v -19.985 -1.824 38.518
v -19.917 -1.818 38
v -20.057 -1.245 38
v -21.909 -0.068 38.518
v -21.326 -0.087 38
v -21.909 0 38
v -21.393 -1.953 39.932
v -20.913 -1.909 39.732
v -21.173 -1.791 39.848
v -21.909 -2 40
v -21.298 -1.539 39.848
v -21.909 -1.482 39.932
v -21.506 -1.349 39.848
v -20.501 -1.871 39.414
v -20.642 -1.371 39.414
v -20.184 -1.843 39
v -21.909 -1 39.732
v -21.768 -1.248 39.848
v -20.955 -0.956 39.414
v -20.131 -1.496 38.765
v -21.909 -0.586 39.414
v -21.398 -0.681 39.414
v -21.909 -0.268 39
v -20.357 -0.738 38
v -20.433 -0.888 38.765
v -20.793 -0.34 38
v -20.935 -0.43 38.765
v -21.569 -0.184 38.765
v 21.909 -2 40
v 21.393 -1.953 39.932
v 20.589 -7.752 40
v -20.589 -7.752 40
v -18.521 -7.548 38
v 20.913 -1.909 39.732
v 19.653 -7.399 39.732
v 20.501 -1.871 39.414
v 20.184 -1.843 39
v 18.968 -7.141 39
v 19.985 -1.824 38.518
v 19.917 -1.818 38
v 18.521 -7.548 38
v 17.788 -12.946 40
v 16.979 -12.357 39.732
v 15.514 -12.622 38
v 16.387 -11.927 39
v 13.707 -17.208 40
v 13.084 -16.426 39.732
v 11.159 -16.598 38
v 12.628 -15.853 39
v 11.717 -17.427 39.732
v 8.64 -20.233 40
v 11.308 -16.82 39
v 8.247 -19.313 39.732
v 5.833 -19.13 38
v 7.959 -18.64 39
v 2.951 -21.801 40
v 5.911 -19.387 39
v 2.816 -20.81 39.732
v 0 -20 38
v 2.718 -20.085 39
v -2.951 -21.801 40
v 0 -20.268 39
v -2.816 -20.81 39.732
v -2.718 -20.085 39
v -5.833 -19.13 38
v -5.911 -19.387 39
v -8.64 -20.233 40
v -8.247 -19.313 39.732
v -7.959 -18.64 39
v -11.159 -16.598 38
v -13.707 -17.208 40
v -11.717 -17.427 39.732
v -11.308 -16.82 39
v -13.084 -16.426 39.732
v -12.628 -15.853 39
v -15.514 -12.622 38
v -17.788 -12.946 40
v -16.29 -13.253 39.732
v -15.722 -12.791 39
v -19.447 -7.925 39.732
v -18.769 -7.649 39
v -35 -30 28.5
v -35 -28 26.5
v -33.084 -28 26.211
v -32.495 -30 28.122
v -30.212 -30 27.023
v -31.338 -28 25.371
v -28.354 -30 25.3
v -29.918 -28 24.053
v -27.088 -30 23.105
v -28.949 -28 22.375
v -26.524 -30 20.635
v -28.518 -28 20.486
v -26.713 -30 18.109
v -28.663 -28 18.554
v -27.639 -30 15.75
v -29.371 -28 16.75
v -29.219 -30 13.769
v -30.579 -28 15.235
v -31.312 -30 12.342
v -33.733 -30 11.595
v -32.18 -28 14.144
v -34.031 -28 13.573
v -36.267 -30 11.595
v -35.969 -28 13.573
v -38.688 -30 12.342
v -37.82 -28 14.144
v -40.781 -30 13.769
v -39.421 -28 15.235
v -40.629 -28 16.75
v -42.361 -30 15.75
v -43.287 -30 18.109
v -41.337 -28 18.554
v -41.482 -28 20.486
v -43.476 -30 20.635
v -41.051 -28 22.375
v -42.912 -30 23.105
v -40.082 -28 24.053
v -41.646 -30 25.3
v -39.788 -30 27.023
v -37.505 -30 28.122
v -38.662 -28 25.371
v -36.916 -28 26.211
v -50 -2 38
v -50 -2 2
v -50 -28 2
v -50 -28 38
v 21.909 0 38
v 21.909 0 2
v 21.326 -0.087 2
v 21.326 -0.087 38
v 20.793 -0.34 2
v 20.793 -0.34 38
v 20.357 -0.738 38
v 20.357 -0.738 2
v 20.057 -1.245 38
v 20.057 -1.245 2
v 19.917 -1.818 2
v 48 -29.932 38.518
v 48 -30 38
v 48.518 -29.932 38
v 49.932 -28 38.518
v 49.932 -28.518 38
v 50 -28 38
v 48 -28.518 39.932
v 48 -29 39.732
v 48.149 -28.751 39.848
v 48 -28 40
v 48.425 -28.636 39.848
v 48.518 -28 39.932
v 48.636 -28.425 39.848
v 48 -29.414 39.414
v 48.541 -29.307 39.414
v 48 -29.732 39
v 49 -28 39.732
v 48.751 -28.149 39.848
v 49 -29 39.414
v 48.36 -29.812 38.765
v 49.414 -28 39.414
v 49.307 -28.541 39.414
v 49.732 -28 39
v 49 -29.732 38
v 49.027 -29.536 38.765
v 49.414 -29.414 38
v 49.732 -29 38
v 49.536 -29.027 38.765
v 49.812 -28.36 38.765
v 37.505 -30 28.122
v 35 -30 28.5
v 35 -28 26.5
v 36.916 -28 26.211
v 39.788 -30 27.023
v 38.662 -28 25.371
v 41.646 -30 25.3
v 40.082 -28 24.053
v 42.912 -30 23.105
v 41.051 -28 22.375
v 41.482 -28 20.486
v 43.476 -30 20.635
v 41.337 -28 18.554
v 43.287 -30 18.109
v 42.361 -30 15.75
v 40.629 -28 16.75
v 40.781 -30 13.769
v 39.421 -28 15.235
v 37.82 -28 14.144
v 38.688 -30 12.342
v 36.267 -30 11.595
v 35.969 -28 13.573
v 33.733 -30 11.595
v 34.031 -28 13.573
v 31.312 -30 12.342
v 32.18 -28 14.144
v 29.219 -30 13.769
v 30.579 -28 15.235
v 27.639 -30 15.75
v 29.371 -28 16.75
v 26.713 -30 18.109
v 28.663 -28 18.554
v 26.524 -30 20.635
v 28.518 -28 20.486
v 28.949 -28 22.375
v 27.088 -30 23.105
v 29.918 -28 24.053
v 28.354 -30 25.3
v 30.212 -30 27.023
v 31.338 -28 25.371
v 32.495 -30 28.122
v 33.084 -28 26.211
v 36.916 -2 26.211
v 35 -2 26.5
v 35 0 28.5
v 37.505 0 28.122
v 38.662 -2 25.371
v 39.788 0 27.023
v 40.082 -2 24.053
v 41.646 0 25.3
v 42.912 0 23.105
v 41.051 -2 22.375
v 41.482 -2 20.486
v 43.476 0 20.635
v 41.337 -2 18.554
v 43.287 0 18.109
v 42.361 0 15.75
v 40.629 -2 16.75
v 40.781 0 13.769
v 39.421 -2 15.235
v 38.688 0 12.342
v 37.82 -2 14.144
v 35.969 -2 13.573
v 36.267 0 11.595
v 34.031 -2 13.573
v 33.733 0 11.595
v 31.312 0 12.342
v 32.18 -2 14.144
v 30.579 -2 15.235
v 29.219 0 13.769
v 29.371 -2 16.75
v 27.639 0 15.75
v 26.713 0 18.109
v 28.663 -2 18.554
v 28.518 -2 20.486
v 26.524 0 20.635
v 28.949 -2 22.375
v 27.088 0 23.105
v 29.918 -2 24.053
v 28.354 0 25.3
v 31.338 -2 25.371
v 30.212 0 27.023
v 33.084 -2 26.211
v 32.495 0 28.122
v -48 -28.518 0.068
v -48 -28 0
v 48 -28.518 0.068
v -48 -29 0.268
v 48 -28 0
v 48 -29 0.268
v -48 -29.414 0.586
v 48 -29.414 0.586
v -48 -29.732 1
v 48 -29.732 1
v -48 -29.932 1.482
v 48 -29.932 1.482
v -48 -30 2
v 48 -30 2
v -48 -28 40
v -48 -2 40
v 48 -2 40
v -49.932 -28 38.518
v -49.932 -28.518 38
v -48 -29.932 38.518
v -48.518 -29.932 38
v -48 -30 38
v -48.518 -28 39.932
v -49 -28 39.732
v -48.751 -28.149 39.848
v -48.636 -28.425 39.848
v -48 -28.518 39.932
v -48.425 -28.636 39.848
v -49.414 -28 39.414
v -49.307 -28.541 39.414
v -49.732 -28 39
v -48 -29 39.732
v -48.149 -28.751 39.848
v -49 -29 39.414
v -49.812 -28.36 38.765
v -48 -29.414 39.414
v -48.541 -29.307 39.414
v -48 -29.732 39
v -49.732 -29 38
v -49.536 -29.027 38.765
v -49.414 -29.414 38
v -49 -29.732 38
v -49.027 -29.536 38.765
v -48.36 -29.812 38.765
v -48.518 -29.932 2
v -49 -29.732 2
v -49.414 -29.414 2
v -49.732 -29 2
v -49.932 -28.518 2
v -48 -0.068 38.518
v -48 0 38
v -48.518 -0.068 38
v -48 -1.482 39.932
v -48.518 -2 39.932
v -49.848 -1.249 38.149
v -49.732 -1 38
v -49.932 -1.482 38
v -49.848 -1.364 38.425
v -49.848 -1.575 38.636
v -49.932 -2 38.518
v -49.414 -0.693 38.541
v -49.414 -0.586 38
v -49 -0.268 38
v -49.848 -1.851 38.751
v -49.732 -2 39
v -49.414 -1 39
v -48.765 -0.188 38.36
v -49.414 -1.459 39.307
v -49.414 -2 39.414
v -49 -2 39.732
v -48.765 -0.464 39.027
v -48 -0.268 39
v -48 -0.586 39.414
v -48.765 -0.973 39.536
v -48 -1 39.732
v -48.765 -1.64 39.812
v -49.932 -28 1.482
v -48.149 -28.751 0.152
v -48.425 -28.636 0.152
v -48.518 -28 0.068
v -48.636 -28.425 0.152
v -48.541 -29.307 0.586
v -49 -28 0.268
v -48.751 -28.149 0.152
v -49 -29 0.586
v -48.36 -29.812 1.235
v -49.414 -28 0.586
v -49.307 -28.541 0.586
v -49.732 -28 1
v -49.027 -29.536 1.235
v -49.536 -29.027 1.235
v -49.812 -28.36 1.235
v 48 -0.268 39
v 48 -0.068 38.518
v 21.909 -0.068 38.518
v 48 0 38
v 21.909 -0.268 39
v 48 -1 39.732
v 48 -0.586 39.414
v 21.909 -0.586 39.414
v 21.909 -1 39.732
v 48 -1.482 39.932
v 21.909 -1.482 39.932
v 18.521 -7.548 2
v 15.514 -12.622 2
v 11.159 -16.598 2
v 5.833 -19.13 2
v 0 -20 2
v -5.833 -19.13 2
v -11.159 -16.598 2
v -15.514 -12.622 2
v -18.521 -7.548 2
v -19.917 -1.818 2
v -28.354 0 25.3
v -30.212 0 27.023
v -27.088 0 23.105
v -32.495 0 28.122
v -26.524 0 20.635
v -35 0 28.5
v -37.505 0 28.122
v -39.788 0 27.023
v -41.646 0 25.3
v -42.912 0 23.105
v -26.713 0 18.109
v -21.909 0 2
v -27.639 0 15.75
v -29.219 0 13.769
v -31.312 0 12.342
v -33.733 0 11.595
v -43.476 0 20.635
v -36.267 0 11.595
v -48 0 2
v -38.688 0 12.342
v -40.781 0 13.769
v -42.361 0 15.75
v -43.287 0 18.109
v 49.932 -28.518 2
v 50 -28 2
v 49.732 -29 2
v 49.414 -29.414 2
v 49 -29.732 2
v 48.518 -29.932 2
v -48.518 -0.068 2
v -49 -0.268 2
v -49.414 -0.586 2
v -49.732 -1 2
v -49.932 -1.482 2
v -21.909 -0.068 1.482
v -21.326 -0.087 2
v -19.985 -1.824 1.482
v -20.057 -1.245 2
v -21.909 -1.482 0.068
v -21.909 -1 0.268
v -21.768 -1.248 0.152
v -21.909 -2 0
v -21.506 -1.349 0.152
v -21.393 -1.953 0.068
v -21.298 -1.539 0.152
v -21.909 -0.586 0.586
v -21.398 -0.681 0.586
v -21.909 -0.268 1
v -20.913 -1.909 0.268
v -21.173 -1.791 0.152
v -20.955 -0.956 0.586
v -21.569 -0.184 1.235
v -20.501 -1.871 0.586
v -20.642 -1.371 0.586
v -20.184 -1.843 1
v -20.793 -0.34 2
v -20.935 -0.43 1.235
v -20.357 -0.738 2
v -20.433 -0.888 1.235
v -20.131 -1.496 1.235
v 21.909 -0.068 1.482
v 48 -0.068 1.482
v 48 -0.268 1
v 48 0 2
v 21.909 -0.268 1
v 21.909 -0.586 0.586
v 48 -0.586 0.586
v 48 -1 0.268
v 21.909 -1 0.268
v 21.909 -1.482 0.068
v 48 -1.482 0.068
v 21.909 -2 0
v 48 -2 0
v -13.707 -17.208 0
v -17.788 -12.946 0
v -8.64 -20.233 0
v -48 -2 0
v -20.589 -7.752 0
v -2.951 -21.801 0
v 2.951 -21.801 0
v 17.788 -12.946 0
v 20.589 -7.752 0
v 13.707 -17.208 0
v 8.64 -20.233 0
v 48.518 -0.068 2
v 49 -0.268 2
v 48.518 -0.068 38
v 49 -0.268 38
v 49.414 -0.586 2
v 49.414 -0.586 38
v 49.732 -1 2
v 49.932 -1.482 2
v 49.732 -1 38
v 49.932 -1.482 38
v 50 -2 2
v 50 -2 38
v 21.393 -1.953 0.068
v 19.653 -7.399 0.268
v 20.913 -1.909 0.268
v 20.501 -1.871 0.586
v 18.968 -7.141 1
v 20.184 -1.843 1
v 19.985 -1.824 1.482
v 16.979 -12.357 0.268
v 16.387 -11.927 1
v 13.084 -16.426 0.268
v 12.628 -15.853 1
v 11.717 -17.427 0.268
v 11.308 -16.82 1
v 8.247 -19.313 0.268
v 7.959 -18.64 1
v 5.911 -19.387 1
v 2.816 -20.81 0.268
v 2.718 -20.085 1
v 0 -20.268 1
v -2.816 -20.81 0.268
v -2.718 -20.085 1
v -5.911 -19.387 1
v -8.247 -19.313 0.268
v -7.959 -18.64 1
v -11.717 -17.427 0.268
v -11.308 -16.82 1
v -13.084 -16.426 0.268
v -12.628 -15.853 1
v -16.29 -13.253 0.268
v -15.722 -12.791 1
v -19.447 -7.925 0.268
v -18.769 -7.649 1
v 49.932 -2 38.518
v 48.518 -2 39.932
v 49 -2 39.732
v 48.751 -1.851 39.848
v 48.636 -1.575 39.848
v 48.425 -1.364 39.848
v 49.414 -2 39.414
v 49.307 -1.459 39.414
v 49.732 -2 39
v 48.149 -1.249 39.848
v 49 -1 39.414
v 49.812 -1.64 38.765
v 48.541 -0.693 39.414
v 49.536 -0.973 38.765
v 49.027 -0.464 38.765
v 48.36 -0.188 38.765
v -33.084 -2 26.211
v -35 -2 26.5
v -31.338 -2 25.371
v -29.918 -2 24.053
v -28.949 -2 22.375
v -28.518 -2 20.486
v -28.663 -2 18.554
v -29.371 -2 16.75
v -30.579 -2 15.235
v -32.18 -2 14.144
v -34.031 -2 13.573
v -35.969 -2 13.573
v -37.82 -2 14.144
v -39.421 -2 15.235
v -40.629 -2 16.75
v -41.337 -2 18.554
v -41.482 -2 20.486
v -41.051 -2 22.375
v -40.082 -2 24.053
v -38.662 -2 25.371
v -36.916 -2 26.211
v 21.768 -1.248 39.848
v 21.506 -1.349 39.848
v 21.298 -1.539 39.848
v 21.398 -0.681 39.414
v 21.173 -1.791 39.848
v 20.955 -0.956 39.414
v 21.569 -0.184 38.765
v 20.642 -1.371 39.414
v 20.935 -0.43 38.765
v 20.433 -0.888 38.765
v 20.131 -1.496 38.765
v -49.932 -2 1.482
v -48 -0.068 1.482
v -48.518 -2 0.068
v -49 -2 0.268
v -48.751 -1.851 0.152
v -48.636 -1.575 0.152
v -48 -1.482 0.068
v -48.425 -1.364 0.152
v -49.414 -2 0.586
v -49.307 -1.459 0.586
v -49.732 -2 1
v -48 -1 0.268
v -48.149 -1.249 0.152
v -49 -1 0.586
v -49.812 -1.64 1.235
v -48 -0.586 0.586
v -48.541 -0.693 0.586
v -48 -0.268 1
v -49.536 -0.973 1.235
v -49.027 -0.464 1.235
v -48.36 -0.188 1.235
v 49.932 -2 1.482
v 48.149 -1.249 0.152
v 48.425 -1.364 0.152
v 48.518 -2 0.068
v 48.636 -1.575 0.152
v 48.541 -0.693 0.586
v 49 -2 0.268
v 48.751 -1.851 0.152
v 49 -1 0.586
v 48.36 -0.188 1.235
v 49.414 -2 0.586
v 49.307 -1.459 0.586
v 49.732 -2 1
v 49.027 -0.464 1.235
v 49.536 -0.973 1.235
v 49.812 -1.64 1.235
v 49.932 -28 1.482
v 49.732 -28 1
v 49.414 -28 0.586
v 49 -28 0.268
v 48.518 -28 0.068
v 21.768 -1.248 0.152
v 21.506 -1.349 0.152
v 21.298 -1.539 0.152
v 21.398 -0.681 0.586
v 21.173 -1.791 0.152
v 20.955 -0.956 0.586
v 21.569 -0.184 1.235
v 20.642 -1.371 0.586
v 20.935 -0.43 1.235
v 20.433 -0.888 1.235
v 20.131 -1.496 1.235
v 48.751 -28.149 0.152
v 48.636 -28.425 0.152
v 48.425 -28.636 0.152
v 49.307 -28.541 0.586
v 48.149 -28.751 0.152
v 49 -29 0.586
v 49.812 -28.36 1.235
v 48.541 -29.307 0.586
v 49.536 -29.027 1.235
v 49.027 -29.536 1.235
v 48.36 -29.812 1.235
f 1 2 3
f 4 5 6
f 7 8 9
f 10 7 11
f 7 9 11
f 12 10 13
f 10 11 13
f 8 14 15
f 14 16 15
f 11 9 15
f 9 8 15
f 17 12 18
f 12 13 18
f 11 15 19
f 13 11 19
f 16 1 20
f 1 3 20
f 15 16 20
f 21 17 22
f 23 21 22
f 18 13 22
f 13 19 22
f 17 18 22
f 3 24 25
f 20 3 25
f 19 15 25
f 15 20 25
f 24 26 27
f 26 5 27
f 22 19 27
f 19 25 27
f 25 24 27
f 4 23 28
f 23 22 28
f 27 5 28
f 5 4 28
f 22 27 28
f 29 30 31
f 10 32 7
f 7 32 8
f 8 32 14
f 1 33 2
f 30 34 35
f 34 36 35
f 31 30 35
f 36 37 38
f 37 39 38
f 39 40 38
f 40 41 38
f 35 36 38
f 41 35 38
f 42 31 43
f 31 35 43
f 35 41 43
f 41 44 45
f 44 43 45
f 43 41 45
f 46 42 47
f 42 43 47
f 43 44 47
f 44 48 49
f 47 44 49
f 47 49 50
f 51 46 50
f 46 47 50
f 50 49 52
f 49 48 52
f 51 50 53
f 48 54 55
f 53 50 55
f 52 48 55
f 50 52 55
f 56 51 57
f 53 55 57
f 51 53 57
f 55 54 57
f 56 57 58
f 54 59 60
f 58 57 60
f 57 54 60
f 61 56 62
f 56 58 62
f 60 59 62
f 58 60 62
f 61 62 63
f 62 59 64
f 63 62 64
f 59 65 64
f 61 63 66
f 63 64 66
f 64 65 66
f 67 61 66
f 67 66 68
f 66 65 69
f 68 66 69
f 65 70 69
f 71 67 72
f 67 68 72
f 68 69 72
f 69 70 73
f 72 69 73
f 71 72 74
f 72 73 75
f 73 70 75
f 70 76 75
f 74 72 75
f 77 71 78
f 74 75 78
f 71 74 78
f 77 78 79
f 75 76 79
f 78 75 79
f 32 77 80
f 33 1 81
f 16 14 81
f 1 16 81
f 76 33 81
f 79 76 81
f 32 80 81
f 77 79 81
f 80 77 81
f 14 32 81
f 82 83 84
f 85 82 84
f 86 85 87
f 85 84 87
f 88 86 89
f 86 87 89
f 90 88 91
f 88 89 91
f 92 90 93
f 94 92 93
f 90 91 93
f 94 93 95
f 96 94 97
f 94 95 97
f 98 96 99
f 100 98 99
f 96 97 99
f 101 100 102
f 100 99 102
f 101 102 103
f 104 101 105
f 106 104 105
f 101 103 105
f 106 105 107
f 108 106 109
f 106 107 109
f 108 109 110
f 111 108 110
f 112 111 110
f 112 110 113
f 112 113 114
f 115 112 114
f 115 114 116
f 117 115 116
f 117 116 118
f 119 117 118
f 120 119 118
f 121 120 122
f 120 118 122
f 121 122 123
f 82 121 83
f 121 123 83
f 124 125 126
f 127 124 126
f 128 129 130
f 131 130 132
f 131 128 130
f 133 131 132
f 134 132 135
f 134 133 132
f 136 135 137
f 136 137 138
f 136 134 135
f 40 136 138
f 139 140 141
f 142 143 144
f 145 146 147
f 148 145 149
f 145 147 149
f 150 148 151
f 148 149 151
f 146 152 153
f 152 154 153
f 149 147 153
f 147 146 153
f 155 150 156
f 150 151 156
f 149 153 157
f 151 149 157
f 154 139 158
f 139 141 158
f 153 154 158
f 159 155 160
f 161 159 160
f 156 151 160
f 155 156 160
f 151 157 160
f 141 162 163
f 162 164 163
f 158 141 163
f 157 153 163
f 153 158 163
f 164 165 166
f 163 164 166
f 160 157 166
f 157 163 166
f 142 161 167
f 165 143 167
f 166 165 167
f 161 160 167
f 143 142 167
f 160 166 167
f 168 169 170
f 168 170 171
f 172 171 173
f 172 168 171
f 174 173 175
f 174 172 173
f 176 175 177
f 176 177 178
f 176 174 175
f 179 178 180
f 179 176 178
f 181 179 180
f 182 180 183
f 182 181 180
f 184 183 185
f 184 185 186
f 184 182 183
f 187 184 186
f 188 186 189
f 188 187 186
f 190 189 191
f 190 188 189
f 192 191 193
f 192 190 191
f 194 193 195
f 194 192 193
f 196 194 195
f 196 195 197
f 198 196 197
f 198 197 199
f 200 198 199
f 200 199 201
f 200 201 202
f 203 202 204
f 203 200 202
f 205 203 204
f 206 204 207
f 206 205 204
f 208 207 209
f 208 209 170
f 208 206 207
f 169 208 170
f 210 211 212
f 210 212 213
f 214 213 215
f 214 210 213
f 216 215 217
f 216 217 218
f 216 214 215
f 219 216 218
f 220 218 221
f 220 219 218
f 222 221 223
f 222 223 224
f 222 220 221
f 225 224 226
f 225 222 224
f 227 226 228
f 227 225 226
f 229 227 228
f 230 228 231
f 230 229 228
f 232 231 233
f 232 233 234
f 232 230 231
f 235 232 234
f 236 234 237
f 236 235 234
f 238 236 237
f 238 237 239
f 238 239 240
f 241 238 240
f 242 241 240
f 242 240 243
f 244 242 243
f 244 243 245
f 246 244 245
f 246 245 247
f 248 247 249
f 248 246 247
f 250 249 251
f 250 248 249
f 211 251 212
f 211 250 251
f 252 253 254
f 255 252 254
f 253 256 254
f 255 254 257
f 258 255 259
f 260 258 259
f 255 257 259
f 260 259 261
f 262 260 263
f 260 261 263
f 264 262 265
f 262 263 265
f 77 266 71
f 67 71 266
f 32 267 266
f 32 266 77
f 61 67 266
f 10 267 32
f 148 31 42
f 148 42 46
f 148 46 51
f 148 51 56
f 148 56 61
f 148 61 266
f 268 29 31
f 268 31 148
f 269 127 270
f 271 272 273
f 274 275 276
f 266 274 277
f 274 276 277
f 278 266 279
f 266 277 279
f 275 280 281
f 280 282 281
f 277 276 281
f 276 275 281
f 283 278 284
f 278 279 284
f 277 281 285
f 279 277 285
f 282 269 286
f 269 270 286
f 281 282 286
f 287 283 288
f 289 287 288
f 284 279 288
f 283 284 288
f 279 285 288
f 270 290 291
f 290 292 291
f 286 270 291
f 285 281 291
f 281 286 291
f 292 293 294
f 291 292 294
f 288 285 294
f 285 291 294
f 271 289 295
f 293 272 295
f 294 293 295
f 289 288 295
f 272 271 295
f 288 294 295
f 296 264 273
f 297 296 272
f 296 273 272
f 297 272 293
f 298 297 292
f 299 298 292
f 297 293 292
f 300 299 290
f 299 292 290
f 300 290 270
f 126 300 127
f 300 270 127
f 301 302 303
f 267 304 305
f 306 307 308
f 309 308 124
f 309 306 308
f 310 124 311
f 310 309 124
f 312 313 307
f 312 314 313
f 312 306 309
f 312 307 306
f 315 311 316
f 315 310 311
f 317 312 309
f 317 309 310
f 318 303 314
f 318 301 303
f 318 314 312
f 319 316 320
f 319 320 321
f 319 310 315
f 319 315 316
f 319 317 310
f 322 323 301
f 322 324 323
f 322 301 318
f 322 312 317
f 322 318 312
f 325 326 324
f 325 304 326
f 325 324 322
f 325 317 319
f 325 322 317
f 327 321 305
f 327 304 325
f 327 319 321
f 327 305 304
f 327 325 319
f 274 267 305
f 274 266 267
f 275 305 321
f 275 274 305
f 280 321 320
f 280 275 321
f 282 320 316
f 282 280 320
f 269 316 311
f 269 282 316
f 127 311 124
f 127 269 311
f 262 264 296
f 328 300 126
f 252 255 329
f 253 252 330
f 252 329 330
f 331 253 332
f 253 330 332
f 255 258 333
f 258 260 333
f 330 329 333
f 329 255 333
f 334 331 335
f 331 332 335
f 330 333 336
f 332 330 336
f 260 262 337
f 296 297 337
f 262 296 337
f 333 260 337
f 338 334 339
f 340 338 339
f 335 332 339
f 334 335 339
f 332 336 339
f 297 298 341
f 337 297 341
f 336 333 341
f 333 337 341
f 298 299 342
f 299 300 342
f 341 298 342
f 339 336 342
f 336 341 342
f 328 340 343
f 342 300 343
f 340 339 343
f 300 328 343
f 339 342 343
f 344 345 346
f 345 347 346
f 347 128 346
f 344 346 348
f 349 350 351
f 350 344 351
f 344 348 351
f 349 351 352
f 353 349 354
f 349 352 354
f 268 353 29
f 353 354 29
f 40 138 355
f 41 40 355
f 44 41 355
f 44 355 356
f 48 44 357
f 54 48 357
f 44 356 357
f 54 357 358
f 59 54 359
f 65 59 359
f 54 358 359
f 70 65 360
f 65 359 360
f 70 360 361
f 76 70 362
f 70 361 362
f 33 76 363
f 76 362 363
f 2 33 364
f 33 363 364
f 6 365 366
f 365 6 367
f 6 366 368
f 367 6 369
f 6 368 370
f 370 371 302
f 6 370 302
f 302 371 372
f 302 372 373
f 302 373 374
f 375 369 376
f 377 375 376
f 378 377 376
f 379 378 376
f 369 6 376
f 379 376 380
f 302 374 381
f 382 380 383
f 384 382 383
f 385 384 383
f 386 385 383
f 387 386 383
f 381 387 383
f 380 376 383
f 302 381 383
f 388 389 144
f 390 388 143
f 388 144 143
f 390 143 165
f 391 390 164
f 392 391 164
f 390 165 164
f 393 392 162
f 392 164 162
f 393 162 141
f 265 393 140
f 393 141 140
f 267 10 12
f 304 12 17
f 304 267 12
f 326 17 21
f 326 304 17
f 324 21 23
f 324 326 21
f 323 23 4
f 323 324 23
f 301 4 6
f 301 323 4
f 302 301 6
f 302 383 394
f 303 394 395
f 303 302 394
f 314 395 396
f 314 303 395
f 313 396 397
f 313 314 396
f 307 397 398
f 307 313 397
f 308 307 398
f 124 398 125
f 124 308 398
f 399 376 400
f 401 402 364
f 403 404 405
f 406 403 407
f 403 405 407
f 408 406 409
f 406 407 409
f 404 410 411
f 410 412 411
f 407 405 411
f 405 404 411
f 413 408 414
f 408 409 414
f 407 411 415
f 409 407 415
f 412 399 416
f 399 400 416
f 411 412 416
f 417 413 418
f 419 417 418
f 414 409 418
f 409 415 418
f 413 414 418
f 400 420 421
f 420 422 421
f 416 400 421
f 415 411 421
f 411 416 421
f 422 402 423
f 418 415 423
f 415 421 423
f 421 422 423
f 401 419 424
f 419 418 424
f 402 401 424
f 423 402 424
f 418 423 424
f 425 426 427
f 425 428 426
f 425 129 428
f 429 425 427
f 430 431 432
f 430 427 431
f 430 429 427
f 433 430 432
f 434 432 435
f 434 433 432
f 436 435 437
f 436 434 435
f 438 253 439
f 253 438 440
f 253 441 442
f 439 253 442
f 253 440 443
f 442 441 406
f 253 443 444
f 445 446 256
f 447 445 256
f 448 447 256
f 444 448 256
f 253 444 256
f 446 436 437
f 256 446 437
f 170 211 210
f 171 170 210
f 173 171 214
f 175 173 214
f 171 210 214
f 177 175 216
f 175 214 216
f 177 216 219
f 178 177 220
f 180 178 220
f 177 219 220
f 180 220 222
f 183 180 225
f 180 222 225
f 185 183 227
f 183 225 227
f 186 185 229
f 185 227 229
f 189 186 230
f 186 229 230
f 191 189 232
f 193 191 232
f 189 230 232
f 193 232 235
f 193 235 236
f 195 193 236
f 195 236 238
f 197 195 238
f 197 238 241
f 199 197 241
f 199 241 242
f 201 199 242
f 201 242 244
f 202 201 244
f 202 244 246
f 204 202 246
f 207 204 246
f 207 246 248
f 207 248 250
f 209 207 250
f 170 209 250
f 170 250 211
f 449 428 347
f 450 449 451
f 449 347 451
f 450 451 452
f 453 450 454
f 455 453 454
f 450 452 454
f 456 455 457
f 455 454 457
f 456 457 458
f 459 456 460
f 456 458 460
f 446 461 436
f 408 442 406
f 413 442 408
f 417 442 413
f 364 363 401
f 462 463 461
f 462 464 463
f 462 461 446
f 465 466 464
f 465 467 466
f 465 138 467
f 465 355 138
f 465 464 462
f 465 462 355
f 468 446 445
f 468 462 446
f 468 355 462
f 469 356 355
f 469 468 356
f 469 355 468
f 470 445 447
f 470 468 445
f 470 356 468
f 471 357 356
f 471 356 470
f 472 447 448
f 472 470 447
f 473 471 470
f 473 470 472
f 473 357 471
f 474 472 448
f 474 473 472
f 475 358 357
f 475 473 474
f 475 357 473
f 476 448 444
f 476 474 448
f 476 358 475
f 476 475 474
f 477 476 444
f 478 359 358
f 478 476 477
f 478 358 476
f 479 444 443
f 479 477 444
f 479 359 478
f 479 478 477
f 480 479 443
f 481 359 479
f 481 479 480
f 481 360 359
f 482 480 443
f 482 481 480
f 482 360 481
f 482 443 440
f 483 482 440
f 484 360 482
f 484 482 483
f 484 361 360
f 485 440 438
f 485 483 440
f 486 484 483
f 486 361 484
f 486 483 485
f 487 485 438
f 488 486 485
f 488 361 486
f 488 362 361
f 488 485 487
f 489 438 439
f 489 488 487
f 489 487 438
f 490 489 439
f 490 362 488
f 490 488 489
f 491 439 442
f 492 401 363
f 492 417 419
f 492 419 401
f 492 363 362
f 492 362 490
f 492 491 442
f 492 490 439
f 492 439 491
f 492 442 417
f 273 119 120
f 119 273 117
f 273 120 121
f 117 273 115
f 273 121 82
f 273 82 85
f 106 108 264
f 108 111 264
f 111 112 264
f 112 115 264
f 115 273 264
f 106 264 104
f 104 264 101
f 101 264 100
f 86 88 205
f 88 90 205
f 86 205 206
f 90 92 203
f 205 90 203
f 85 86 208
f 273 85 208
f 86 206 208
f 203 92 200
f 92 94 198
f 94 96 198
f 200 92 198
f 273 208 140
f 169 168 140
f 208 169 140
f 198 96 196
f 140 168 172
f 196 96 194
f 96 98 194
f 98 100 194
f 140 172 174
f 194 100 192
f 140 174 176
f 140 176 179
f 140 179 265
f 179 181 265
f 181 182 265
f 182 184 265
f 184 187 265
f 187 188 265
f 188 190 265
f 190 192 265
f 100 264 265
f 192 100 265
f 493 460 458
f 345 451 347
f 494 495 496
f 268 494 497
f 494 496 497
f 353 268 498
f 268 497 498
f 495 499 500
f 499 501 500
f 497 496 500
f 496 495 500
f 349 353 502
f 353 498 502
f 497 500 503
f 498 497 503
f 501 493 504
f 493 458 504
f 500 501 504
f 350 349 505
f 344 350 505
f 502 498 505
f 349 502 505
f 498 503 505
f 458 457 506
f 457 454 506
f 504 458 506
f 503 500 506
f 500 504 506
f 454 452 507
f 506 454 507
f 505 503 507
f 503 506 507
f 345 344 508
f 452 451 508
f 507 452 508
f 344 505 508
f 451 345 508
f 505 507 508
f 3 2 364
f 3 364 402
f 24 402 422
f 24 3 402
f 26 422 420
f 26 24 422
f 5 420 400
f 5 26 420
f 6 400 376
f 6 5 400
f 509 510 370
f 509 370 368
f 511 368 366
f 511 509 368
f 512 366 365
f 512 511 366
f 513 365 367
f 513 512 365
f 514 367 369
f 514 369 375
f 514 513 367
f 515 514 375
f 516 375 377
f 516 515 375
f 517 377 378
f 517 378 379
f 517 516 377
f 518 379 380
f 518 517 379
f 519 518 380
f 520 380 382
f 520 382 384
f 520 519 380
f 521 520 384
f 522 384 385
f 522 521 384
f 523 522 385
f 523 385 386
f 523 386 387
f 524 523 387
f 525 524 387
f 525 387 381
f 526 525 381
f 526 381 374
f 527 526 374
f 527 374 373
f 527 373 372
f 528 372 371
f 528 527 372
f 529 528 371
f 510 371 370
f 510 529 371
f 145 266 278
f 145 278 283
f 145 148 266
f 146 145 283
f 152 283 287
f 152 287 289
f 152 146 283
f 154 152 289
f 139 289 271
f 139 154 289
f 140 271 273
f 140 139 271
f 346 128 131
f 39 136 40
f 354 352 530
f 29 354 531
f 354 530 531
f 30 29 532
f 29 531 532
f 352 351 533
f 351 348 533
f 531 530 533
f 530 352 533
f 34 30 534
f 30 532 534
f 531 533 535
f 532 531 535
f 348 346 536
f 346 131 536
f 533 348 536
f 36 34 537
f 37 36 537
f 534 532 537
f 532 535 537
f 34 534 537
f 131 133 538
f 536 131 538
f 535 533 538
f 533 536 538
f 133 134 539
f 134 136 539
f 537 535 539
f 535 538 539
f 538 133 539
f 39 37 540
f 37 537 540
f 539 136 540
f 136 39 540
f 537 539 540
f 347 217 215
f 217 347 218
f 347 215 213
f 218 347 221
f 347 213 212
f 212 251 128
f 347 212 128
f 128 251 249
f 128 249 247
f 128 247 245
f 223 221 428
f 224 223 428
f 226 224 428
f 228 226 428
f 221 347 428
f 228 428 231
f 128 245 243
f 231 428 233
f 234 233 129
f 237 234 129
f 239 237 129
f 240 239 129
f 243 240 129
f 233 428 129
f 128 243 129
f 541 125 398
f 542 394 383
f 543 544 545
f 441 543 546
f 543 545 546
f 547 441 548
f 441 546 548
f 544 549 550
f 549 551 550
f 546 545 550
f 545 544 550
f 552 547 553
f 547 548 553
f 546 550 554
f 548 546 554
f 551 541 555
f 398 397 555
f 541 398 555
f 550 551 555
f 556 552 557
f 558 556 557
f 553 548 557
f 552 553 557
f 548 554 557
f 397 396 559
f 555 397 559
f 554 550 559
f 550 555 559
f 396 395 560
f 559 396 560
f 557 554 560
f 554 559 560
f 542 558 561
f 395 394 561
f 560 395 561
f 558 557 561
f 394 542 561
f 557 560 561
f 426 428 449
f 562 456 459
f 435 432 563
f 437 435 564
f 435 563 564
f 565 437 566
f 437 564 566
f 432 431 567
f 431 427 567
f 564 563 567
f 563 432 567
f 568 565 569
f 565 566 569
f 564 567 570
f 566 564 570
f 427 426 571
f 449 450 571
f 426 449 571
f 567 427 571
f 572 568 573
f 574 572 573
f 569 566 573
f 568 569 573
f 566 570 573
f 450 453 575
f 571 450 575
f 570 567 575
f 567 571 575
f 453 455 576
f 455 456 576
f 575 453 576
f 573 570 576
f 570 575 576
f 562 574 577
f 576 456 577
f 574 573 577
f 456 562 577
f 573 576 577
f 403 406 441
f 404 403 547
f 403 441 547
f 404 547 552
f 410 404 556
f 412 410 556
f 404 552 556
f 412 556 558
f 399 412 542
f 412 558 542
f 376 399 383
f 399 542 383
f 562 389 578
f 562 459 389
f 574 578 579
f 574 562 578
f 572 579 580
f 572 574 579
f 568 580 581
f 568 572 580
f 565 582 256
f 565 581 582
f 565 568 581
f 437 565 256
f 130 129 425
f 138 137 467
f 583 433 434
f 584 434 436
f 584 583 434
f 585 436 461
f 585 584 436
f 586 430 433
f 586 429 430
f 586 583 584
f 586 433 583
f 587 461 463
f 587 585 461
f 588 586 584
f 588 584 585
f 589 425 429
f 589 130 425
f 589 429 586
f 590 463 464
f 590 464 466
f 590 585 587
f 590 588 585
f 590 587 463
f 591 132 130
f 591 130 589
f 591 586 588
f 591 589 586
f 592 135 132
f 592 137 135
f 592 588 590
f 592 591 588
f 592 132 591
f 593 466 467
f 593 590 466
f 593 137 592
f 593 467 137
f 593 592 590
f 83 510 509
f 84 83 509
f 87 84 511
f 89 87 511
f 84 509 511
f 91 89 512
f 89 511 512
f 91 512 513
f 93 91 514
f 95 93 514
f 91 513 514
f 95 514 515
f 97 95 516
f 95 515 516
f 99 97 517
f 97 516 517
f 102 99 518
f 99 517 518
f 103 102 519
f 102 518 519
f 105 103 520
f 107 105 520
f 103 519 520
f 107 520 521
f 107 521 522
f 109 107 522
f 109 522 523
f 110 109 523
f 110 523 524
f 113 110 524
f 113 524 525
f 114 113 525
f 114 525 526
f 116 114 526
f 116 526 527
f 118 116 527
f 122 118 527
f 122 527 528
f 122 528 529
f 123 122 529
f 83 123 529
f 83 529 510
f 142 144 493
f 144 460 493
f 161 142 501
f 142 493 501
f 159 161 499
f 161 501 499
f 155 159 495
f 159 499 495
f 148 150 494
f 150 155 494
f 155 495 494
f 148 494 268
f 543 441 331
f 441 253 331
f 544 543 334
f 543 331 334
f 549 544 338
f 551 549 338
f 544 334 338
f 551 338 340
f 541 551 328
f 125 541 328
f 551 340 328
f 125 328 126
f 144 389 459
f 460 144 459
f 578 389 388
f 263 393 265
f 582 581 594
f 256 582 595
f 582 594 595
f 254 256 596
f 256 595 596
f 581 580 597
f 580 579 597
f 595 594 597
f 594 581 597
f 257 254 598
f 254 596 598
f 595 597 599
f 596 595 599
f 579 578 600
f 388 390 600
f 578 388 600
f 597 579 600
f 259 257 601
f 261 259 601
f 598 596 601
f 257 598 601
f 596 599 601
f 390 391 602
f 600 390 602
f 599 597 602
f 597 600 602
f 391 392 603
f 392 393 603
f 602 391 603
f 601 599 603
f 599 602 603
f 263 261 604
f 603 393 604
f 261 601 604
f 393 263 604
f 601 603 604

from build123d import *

# Parameters (mm, degrees)
DODANIE_WYCI_GNI_CIE1_DEPTH = 40
WYTNIJ_WYCI_GNI_CIE1_REACH  = 72.711
SZKIC2_R                    = 6.5
SFAZOWANIE1_SIZE            = 2
ZAOKR_GLENIE1_R             = 2


with BuildPart() as part:
    # Szkic1 → Dodanie-wyciągnięcie1 (new body)
    with BuildSketch(Plane.XY):
        with BuildLine():
            Line((50, 0), (20, 0))
            ThreePointArc((20, 0), (0, -20), (-20, 0))
            Line((-20, 0), (-50, 0))
            Line((-50, 0), (-50, -30))
            Line((-50, -30), (50, -30))
            Line((50, -30), (50, 0))
        make_face()
    extrude(amount=DODANIE_WYCI_GNI_CIE1_DEPTH)

    # Szkic2 → Wytnij-wyciągnięcie1 (cut, up to next)
    with BuildSketch(Plane(origin=(0, 0, 0), x_dir=(1, 0, 0), z_dir=(0, 1, 0)), mode=Mode.PRIVATE) as wytnij_wyci_gni_cie1_sk1:
        with Locations(Location((-35, -20, 0), (0, 0, 270))):
            Circle(SZKIC2_R)
    wytnij_wyci_gni_cie1_tool1 = extrude(wytnij_wyci_gni_cie1_sk1.sketch, amount=-WYTNIJ_WYCI_GNI_CIE1_REACH, mode=Mode.PRIVATE) & part.part
    # Szkic2 → Wytnij-wyciągnięcie1 (cut, up to next)
    with BuildSketch(Plane(origin=(0, 0, 0), x_dir=(1, 0, 0), z_dir=(0, 1, 0)), mode=Mode.PRIVATE) as wytnij_wyci_gni_cie1_sk2:
        with Locations(Location((35, -20, 0), (0, 0, 270))):
            Circle(SZKIC2_R)
    wytnij_wyci_gni_cie1_tool2 = extrude(wytnij_wyci_gni_cie1_sk2.sketch, amount=-WYTNIJ_WYCI_GNI_CIE1_REACH, mode=Mode.PRIVATE) & part.part
    add(wytnij_wyci_gni_cie1_tool1.solids().sort_by_distance((-35, 0, 20))[0], mode=Mode.SUBTRACT)
    add(wytnij_wyci_gni_cie1_tool2.solids().sort_by_distance((35, 0, 20))[0], mode=Mode.SUBTRACT)

    # Sfazowanie1
    sfazowanie1_edges = [part.edges().sort_by_distance(p)[0] for p in [
        (-35, 0, 13.5),
        (-35, -30, 13.5),
        (35, 0, 13.5),
        (35, -30, 13.5),
    ]]
    chamfer(sfazowanie1_edges, length=SFAZOWANIE1_SIZE)

    # Zaokrąglenie1
    zaokr_glenie1_edges = [part.edges().sort_by_distance(p)[0] for p in [
        (0, -20, 0),
        (-35, 0, 40),
        (20, 0, 20),
        (50, 0, 20),
        (50, -30, 20),
        (-50, -30, 20),
        (-50, 0, 20),
        (-20, 0, 20),
        (-50, -15, 40),
        (0, -30, 40),
        (50, -15, 40),
        (35, 0, 40),
        (0, -20, 40),
        (35, 0, 0),
        (50, -15, 0),
        (0, -30, 0),
        (-50, -15, 0),
        (-35, 0, 0),
    ]]
    fillet(zaokr_glenie1_edges, radius=ZAOKR_GLENIE1_R)


solid = part.part
